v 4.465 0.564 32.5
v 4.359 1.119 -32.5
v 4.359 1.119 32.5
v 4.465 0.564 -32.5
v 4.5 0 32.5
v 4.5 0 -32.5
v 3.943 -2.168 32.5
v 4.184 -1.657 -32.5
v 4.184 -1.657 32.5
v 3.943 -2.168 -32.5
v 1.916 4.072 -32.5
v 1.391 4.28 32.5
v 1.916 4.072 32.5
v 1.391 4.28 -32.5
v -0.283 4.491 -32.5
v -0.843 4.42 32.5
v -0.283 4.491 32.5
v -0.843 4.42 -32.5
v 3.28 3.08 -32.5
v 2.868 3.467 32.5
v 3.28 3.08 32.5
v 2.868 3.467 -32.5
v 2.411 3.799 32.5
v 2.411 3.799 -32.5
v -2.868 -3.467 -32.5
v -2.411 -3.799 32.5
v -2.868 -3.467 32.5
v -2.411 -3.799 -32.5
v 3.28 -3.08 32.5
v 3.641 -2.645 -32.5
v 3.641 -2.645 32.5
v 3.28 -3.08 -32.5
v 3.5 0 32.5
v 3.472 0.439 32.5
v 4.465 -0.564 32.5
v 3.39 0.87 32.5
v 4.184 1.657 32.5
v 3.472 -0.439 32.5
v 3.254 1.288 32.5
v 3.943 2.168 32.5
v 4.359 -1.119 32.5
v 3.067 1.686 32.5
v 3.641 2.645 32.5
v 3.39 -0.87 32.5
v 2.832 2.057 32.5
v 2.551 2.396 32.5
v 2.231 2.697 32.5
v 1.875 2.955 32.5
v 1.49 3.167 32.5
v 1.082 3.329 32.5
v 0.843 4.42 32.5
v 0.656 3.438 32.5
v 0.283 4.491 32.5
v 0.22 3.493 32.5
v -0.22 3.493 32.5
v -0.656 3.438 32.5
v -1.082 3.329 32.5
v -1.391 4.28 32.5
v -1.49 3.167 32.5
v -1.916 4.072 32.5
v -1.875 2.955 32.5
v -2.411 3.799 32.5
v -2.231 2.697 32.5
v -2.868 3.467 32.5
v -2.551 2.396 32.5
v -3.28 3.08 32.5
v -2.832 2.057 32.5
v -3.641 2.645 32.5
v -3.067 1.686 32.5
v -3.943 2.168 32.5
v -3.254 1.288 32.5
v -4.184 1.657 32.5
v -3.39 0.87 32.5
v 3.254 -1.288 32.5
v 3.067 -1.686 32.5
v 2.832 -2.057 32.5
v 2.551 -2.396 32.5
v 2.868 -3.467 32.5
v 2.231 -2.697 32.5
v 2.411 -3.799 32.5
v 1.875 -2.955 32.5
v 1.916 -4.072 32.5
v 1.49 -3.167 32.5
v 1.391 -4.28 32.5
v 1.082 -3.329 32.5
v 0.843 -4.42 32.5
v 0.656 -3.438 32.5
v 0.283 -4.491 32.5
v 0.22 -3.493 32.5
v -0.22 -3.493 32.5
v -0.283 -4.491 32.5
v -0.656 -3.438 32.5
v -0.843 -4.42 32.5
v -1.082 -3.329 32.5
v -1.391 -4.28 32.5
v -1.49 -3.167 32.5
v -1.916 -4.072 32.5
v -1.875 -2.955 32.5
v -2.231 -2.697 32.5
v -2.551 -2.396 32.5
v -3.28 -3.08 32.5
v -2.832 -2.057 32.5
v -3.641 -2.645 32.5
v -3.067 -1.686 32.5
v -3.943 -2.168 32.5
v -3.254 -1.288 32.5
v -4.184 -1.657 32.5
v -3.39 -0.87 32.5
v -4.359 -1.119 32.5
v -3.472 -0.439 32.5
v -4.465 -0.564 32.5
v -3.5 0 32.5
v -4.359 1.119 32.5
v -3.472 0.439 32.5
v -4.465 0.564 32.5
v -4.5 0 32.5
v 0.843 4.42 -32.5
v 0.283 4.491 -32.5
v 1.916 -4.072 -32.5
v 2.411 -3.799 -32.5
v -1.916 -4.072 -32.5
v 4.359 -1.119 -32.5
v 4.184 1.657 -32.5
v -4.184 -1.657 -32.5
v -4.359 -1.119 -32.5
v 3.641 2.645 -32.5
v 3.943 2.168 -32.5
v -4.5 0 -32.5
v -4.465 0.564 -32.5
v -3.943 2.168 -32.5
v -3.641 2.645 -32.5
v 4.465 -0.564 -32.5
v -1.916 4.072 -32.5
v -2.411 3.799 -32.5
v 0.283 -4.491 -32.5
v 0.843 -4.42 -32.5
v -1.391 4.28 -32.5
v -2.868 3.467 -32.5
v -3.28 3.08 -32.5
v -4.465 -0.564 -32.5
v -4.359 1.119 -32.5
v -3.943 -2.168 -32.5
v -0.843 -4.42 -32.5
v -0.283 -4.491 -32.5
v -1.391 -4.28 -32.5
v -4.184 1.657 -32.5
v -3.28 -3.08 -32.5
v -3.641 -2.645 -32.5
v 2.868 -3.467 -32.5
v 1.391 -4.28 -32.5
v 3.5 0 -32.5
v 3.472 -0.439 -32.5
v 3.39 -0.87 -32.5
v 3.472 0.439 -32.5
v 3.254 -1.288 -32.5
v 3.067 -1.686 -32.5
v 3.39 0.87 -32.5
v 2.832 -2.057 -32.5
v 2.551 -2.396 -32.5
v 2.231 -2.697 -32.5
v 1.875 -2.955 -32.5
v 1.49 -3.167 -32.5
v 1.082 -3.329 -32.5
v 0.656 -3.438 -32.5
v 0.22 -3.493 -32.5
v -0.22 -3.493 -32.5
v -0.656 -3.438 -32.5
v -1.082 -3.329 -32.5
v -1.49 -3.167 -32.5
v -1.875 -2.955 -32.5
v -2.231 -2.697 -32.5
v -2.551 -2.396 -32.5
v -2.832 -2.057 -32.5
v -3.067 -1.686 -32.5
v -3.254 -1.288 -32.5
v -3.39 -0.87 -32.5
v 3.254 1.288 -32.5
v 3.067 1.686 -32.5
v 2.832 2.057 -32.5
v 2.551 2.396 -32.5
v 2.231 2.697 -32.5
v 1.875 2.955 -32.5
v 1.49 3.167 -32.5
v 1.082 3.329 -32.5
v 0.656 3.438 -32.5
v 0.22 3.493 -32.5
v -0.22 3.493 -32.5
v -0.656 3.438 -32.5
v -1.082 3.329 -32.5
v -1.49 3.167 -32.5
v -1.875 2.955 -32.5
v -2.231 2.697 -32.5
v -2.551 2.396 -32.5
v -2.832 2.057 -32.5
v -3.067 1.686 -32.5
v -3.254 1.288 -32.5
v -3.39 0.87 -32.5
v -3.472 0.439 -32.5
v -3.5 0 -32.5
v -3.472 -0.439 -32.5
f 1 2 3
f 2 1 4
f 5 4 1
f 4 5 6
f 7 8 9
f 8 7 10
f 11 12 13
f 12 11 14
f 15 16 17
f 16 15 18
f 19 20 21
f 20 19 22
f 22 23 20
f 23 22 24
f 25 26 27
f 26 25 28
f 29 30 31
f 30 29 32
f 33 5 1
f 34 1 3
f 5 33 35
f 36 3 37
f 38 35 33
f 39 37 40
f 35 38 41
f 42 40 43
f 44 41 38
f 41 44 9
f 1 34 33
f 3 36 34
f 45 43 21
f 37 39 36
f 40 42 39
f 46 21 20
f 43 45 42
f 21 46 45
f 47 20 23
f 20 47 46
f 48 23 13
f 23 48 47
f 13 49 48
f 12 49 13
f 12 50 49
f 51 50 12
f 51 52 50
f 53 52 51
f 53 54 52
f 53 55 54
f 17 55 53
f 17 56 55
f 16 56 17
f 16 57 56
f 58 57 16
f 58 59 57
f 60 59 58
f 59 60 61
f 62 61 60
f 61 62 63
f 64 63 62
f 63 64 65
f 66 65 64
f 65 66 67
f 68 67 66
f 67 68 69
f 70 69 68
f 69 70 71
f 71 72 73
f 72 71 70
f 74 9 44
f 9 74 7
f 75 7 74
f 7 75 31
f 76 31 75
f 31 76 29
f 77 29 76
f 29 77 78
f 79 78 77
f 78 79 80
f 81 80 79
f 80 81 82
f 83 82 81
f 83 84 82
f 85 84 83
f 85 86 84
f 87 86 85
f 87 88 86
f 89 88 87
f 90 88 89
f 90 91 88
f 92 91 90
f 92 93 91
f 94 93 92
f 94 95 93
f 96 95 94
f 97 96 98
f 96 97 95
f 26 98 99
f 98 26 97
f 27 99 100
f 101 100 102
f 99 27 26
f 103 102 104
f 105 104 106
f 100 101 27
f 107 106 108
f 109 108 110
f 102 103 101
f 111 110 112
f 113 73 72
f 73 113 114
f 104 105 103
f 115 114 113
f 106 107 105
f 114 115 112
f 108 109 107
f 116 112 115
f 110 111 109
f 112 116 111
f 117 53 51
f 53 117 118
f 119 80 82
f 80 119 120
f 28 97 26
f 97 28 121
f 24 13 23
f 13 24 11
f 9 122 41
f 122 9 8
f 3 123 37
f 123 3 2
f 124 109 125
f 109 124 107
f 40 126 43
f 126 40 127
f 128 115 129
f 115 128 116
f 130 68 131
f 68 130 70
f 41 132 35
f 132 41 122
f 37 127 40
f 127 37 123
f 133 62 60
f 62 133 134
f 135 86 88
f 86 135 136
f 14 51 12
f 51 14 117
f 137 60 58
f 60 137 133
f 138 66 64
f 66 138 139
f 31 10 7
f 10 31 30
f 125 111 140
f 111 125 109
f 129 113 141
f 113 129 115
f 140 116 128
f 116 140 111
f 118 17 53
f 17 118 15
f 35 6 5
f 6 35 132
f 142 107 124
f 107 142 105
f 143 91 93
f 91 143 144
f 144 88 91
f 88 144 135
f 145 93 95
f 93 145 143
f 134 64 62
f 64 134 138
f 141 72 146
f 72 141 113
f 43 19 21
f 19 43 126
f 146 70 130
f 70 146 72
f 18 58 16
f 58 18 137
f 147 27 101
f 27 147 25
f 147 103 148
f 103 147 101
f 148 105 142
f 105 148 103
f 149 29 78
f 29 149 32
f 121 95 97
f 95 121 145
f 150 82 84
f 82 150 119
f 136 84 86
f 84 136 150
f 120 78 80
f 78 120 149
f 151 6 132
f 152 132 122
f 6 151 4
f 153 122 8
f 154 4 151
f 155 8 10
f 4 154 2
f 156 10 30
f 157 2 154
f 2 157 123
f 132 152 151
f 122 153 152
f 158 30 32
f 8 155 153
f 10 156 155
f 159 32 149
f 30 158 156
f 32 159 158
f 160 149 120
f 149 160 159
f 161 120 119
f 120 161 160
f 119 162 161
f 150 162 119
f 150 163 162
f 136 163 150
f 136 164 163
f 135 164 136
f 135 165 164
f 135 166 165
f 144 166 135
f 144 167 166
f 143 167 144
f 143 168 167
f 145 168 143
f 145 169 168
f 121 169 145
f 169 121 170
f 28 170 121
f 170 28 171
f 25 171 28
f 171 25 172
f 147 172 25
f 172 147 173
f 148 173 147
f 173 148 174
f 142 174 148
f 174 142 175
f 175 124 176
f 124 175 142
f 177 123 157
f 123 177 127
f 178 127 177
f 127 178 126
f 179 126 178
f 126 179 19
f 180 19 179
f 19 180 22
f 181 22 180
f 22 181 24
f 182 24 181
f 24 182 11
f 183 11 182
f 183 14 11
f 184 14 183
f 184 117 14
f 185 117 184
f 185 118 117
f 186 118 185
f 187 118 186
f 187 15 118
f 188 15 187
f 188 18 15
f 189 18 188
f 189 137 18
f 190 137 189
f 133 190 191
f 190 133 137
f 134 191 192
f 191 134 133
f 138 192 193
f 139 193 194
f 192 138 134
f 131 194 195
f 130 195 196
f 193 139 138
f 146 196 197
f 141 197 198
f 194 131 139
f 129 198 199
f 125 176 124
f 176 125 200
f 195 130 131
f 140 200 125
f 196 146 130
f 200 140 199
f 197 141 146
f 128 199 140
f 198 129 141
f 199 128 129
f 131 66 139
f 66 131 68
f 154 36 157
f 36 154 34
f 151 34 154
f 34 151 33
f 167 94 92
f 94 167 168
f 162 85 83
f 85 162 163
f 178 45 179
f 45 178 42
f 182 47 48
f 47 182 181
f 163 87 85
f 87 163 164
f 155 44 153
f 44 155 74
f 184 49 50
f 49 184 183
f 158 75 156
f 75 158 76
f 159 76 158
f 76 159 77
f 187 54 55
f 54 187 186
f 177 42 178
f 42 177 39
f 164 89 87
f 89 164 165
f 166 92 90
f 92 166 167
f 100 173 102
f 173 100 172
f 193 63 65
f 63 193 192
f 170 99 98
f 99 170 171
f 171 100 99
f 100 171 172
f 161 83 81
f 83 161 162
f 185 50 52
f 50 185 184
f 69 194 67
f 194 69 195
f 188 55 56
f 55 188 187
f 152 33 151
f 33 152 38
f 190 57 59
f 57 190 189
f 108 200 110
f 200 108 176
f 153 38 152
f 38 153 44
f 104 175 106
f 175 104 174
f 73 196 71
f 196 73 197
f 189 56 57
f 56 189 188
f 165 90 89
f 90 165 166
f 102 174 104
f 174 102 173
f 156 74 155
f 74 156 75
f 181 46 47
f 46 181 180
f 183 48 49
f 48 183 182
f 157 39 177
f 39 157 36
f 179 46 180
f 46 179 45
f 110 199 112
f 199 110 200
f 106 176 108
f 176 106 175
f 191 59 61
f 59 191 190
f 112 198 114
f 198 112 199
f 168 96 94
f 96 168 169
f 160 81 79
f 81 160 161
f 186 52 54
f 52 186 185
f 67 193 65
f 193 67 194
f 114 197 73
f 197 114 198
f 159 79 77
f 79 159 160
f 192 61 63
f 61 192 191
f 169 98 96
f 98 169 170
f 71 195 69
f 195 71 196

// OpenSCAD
$fn = 50;


difference() {
	union() {
		translate(v = [0, 0, -32.5000000000]) {
			cylinder(h = 65, r = 4.5000000000);
		}
	}
	union() {
		translate(v = [0, 0, -100.0000000000]) {
			cylinder(h = 200, r = 3.5000000000);
		}
	}
}
